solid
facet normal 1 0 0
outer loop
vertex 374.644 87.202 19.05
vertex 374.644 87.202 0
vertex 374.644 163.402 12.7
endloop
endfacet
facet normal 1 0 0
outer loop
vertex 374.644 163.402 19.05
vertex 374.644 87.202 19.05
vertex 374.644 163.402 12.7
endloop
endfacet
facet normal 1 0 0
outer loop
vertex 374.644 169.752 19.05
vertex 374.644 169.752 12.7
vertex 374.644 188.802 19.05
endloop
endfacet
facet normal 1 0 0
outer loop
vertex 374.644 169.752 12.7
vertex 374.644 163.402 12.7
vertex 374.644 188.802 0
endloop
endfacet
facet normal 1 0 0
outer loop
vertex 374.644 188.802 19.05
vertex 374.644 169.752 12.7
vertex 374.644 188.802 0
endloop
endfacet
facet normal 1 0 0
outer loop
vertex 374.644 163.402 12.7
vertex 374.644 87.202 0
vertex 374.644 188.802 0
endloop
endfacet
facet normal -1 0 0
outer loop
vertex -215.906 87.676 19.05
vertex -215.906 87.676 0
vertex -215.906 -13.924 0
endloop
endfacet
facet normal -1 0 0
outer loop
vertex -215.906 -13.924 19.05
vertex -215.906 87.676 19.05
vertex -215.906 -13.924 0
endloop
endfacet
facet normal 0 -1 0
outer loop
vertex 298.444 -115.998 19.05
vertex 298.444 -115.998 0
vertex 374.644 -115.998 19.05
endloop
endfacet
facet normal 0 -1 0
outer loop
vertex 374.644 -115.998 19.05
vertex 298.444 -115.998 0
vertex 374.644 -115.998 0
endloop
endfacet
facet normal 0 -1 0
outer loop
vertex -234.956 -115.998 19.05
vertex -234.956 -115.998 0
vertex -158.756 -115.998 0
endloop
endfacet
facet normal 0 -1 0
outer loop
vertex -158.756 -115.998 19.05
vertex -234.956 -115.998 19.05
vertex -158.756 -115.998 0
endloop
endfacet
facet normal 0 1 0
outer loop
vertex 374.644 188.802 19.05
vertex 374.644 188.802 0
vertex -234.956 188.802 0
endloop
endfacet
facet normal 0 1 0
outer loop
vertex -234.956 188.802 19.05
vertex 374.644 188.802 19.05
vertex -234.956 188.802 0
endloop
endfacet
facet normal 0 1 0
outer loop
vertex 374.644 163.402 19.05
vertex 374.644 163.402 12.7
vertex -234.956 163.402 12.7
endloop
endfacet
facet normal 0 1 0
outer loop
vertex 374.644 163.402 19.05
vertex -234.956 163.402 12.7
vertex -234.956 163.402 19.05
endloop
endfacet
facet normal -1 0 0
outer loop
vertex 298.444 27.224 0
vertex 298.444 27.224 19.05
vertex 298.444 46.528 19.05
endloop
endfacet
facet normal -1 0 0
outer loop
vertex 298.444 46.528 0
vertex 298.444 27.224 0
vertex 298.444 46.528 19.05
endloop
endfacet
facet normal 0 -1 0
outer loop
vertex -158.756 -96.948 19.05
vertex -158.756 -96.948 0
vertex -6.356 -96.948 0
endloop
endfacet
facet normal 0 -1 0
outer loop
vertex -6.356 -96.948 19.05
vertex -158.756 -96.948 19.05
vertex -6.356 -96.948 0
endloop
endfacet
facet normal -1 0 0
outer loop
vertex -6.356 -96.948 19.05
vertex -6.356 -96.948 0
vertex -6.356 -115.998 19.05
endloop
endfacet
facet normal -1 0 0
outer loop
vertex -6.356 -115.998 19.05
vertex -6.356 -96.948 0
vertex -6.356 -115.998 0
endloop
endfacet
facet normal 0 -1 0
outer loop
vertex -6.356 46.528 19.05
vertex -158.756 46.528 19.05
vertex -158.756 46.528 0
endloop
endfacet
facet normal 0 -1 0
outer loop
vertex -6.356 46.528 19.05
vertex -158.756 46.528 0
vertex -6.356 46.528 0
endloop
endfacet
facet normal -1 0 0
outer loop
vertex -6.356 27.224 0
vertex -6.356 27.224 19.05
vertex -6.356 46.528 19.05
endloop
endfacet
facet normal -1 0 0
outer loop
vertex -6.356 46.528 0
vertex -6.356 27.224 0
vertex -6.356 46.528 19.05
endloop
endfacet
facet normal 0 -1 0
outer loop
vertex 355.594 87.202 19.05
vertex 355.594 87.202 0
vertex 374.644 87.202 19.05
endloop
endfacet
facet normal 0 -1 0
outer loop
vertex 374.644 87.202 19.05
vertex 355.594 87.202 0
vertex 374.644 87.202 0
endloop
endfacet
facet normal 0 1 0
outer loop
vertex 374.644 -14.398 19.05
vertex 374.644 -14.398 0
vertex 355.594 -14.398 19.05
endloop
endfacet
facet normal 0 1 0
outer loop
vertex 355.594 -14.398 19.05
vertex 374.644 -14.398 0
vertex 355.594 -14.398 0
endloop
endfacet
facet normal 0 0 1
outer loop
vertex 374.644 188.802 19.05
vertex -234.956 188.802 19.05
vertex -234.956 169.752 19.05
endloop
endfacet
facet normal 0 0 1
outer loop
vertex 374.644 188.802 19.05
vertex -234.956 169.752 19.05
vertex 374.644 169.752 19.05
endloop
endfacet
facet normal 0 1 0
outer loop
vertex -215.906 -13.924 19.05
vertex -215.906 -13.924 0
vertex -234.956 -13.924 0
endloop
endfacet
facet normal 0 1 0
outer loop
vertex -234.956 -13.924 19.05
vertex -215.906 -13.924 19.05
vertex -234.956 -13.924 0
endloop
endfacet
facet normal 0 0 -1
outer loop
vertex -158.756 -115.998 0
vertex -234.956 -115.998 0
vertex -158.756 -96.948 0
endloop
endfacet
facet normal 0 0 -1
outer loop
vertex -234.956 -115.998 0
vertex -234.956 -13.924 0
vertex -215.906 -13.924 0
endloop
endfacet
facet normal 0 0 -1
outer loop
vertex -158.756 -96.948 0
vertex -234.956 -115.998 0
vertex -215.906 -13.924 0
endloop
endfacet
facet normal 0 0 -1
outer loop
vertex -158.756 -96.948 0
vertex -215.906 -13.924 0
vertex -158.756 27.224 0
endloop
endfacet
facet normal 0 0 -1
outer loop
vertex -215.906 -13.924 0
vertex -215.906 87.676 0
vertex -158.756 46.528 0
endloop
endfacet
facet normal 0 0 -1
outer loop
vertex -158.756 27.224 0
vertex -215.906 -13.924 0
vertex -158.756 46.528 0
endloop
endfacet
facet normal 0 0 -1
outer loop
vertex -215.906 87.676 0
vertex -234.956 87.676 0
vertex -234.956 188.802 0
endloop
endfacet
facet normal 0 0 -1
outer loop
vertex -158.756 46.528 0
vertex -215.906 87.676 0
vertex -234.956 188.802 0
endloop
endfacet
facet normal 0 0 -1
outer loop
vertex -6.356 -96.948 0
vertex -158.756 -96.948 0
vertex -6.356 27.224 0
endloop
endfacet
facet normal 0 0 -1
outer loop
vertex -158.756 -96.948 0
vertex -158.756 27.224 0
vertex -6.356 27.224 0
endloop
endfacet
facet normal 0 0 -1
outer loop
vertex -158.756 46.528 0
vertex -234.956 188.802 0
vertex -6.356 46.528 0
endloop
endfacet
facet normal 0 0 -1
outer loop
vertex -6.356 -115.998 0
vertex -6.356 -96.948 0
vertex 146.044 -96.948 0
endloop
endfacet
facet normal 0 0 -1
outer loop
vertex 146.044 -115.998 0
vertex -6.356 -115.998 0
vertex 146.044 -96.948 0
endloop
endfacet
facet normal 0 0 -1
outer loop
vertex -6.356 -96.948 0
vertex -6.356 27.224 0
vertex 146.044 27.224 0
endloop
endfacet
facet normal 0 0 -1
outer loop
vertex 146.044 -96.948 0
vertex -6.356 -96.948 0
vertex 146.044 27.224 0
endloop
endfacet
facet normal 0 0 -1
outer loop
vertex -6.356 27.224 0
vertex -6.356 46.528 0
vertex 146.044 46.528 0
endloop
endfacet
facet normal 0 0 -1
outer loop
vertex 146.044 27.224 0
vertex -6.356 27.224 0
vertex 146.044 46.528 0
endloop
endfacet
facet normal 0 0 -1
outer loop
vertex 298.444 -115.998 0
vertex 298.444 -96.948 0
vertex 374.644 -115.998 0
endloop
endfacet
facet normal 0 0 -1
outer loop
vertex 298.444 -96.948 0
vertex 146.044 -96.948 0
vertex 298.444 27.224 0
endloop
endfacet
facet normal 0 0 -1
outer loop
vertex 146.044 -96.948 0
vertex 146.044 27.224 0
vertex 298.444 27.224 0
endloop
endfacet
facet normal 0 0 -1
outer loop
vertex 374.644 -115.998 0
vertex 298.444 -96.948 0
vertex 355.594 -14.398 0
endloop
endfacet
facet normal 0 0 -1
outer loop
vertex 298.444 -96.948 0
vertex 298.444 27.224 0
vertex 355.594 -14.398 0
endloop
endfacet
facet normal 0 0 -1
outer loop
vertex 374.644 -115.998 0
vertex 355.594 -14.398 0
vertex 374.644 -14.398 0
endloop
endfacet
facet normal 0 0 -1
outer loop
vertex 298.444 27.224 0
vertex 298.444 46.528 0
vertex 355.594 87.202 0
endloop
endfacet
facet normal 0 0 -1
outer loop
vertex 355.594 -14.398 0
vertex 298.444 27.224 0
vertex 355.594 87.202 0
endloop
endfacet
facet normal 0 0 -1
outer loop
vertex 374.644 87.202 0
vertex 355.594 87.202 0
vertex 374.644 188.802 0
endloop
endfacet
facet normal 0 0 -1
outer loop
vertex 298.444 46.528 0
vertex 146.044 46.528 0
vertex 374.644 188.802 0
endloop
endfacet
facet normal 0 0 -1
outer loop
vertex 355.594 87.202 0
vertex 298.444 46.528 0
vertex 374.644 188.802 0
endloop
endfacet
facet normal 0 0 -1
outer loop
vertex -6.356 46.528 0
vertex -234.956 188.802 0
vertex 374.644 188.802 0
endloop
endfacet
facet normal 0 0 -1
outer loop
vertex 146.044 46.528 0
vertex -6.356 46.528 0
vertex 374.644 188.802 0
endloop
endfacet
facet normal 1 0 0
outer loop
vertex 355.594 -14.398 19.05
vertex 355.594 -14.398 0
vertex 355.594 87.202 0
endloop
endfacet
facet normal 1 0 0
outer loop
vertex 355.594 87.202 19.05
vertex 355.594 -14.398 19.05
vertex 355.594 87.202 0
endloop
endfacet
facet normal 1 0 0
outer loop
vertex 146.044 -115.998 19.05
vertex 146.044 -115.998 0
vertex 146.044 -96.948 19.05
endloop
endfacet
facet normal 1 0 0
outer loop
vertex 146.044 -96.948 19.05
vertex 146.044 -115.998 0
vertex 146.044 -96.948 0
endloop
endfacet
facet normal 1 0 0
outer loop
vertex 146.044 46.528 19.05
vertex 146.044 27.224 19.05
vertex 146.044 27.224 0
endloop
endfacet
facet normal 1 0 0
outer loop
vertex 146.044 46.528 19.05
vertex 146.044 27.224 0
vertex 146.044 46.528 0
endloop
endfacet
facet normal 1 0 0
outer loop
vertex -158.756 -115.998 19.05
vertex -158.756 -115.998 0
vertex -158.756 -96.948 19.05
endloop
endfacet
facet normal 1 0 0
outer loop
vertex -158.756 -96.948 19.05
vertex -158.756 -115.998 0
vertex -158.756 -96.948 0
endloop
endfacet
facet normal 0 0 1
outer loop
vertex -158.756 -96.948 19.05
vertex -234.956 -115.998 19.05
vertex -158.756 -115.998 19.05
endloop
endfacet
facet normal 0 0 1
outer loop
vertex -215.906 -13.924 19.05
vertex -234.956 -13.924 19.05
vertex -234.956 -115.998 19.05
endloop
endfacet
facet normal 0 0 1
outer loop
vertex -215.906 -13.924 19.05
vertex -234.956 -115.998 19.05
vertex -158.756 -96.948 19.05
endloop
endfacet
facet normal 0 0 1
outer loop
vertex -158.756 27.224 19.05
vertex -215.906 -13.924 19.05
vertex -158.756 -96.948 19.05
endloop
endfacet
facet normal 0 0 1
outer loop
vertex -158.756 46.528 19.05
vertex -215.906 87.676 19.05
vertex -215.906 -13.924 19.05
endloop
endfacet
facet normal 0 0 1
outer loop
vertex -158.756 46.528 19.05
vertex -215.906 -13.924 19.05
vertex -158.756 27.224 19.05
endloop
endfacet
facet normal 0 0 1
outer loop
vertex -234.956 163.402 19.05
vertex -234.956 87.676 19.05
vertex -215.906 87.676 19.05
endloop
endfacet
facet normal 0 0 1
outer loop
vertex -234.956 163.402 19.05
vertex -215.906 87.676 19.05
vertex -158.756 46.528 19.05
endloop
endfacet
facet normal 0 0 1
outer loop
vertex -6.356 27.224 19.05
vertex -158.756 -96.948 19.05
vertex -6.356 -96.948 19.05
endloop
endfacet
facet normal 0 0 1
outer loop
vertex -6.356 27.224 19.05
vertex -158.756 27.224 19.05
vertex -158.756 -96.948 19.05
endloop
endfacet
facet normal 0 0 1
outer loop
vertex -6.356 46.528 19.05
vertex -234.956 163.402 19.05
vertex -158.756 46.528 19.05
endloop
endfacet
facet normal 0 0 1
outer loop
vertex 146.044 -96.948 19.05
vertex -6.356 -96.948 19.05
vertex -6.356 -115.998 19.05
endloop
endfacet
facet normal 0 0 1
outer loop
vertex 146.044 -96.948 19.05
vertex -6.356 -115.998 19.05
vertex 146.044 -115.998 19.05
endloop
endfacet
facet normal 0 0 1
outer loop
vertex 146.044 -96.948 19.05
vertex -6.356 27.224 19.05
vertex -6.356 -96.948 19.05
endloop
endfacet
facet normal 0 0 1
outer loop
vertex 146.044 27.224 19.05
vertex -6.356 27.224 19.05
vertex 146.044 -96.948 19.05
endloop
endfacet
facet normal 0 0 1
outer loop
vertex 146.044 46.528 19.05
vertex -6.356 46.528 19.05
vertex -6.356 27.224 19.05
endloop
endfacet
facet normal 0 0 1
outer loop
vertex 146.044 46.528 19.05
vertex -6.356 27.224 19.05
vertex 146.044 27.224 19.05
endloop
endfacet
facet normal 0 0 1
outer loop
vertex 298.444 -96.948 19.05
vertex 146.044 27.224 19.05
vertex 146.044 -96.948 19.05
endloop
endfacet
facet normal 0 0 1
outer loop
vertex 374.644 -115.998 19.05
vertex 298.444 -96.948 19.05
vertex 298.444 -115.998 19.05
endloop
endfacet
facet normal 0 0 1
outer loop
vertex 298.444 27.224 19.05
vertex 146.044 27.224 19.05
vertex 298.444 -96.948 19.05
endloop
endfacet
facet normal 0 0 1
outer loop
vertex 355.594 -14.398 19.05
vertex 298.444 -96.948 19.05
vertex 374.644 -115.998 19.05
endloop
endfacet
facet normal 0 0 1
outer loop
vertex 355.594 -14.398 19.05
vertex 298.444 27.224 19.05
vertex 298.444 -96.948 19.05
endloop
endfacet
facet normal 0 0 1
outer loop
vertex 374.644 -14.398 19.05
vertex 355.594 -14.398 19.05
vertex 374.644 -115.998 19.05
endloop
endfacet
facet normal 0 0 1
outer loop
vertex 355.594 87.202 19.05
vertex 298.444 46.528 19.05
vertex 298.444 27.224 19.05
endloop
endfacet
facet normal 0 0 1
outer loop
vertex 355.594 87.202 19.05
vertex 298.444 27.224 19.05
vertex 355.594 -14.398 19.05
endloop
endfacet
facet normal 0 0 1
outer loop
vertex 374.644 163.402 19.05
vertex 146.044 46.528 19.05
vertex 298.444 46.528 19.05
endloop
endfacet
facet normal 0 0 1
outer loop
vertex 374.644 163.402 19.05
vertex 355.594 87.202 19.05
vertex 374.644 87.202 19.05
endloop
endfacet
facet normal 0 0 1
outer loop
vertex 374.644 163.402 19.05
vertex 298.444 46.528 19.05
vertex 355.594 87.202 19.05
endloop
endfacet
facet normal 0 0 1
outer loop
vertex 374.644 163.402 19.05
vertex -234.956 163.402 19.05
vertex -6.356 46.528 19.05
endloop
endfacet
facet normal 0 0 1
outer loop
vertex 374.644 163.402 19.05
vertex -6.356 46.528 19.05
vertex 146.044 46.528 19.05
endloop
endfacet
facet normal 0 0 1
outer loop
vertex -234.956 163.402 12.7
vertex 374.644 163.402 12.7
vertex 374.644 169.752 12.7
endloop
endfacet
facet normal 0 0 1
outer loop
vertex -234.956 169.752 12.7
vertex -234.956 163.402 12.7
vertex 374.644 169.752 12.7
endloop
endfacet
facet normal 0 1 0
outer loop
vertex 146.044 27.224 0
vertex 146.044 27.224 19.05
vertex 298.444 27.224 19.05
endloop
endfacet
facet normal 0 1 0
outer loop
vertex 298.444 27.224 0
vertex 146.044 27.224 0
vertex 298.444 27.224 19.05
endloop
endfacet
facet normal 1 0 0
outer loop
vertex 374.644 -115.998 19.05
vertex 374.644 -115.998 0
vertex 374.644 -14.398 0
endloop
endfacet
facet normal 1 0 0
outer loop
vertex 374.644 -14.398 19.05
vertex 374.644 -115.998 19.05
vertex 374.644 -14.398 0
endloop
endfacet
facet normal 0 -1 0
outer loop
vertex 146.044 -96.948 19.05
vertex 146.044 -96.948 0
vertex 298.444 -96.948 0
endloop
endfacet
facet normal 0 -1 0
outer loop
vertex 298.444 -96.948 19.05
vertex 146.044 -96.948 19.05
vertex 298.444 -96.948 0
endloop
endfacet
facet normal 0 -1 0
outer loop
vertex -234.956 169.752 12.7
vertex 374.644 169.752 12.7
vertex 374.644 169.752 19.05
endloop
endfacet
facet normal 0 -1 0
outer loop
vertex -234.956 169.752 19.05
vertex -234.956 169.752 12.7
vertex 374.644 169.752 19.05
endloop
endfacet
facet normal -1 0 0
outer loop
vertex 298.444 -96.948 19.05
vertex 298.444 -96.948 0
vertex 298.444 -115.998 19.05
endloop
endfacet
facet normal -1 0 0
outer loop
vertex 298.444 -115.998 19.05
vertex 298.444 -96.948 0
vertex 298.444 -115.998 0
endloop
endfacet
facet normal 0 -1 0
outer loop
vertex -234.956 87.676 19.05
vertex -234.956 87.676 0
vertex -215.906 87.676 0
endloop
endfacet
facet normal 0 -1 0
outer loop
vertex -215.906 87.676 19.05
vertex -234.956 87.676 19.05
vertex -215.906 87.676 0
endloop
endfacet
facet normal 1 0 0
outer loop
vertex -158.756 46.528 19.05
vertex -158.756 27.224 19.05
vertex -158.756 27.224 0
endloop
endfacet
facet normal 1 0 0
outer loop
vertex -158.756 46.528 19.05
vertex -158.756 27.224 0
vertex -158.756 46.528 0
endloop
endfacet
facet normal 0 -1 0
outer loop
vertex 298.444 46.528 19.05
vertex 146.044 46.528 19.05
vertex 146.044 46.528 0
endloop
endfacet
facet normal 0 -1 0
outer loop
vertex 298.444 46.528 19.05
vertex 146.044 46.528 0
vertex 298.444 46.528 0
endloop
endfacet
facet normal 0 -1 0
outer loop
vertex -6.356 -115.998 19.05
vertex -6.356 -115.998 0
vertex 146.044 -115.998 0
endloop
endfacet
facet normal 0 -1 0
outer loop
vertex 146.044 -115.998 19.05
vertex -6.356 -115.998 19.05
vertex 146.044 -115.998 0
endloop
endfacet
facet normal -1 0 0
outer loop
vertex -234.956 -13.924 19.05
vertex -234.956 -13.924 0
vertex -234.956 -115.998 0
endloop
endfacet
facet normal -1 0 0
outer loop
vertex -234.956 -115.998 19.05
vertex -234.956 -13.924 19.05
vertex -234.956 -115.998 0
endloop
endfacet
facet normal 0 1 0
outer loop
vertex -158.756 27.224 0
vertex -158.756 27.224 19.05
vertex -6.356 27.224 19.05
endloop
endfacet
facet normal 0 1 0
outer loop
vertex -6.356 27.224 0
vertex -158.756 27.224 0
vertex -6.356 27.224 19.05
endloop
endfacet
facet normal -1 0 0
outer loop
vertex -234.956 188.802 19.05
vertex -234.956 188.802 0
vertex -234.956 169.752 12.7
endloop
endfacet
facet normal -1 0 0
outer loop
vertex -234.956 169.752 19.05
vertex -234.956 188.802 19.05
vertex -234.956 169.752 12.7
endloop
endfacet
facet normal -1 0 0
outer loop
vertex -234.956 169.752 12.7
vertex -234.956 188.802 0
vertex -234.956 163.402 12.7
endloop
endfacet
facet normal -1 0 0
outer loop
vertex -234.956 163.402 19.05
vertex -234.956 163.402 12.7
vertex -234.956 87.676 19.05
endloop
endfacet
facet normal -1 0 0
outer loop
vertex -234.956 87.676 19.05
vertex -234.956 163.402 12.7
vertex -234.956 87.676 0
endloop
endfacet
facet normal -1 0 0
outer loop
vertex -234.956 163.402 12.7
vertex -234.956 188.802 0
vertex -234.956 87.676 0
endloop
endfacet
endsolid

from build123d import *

# Parameters (mm, degrees)
F1_DEPTH = 19.05
F2_W     = 152.4
F2_H     = 19.304
F3_DEPTH = 19.051
F4_W     = 6.35
F4_H     = 6.35
F5_DEPTH = 609.601


with BuildPart() as f1:
    # F0 (on Top) → F1 (new body)
    with BuildSketch(Plane.XY):
        Polygon((-158.75611, 188.8015), (-234.95611, 188.8015), (-234.95611, 87.67615), (-215.90611, 87.67615), (-215.90611, -13.92385), (-234.95611, -13.92385), (-234.95611, -115.9985), (-158.75611, -115.9985), (-158.75611, -96.9485), (-6.35611, -96.9485), (-6.35611, -115.9985), (146.04389, -115.9985), (146.04389, -96.9485), (298.44389, -96.9485), (298.44389, -115.9985), (374.64389, -115.9985), (374.64389, -14.3985), (355.59389, -14.3985), (355.59389, 87.2015), (374.64389, 87.2015), (374.64389, 188.8015), (298.44389, 188.8015), align=None)
    extrude(amount=F1_DEPTH)

    # F2 (on face) → F3 (cut, through all)
    with BuildSketch(Plane.XY.offset(19.05)):
        with Locations((-82.55611, 36.87615)):
            Rectangle(F2_W, F2_H)
        with Locations((222.24389, 36.87615)):
            Rectangle(F2_W, F2_H)
    extrude(amount=-F3_DEPTH, mode=Mode.SUBTRACT)

    # F4 (on face) → F5 (cut, through all)
    with BuildSketch(Plane.YZ.offset(374.64389)):
        with Locations((166.5765, 15.875)):
            Rectangle(F4_W, F4_H)
    extrude(amount=-F5_DEPTH, mode=Mode.SUBTRACT)


solid = f1.part
